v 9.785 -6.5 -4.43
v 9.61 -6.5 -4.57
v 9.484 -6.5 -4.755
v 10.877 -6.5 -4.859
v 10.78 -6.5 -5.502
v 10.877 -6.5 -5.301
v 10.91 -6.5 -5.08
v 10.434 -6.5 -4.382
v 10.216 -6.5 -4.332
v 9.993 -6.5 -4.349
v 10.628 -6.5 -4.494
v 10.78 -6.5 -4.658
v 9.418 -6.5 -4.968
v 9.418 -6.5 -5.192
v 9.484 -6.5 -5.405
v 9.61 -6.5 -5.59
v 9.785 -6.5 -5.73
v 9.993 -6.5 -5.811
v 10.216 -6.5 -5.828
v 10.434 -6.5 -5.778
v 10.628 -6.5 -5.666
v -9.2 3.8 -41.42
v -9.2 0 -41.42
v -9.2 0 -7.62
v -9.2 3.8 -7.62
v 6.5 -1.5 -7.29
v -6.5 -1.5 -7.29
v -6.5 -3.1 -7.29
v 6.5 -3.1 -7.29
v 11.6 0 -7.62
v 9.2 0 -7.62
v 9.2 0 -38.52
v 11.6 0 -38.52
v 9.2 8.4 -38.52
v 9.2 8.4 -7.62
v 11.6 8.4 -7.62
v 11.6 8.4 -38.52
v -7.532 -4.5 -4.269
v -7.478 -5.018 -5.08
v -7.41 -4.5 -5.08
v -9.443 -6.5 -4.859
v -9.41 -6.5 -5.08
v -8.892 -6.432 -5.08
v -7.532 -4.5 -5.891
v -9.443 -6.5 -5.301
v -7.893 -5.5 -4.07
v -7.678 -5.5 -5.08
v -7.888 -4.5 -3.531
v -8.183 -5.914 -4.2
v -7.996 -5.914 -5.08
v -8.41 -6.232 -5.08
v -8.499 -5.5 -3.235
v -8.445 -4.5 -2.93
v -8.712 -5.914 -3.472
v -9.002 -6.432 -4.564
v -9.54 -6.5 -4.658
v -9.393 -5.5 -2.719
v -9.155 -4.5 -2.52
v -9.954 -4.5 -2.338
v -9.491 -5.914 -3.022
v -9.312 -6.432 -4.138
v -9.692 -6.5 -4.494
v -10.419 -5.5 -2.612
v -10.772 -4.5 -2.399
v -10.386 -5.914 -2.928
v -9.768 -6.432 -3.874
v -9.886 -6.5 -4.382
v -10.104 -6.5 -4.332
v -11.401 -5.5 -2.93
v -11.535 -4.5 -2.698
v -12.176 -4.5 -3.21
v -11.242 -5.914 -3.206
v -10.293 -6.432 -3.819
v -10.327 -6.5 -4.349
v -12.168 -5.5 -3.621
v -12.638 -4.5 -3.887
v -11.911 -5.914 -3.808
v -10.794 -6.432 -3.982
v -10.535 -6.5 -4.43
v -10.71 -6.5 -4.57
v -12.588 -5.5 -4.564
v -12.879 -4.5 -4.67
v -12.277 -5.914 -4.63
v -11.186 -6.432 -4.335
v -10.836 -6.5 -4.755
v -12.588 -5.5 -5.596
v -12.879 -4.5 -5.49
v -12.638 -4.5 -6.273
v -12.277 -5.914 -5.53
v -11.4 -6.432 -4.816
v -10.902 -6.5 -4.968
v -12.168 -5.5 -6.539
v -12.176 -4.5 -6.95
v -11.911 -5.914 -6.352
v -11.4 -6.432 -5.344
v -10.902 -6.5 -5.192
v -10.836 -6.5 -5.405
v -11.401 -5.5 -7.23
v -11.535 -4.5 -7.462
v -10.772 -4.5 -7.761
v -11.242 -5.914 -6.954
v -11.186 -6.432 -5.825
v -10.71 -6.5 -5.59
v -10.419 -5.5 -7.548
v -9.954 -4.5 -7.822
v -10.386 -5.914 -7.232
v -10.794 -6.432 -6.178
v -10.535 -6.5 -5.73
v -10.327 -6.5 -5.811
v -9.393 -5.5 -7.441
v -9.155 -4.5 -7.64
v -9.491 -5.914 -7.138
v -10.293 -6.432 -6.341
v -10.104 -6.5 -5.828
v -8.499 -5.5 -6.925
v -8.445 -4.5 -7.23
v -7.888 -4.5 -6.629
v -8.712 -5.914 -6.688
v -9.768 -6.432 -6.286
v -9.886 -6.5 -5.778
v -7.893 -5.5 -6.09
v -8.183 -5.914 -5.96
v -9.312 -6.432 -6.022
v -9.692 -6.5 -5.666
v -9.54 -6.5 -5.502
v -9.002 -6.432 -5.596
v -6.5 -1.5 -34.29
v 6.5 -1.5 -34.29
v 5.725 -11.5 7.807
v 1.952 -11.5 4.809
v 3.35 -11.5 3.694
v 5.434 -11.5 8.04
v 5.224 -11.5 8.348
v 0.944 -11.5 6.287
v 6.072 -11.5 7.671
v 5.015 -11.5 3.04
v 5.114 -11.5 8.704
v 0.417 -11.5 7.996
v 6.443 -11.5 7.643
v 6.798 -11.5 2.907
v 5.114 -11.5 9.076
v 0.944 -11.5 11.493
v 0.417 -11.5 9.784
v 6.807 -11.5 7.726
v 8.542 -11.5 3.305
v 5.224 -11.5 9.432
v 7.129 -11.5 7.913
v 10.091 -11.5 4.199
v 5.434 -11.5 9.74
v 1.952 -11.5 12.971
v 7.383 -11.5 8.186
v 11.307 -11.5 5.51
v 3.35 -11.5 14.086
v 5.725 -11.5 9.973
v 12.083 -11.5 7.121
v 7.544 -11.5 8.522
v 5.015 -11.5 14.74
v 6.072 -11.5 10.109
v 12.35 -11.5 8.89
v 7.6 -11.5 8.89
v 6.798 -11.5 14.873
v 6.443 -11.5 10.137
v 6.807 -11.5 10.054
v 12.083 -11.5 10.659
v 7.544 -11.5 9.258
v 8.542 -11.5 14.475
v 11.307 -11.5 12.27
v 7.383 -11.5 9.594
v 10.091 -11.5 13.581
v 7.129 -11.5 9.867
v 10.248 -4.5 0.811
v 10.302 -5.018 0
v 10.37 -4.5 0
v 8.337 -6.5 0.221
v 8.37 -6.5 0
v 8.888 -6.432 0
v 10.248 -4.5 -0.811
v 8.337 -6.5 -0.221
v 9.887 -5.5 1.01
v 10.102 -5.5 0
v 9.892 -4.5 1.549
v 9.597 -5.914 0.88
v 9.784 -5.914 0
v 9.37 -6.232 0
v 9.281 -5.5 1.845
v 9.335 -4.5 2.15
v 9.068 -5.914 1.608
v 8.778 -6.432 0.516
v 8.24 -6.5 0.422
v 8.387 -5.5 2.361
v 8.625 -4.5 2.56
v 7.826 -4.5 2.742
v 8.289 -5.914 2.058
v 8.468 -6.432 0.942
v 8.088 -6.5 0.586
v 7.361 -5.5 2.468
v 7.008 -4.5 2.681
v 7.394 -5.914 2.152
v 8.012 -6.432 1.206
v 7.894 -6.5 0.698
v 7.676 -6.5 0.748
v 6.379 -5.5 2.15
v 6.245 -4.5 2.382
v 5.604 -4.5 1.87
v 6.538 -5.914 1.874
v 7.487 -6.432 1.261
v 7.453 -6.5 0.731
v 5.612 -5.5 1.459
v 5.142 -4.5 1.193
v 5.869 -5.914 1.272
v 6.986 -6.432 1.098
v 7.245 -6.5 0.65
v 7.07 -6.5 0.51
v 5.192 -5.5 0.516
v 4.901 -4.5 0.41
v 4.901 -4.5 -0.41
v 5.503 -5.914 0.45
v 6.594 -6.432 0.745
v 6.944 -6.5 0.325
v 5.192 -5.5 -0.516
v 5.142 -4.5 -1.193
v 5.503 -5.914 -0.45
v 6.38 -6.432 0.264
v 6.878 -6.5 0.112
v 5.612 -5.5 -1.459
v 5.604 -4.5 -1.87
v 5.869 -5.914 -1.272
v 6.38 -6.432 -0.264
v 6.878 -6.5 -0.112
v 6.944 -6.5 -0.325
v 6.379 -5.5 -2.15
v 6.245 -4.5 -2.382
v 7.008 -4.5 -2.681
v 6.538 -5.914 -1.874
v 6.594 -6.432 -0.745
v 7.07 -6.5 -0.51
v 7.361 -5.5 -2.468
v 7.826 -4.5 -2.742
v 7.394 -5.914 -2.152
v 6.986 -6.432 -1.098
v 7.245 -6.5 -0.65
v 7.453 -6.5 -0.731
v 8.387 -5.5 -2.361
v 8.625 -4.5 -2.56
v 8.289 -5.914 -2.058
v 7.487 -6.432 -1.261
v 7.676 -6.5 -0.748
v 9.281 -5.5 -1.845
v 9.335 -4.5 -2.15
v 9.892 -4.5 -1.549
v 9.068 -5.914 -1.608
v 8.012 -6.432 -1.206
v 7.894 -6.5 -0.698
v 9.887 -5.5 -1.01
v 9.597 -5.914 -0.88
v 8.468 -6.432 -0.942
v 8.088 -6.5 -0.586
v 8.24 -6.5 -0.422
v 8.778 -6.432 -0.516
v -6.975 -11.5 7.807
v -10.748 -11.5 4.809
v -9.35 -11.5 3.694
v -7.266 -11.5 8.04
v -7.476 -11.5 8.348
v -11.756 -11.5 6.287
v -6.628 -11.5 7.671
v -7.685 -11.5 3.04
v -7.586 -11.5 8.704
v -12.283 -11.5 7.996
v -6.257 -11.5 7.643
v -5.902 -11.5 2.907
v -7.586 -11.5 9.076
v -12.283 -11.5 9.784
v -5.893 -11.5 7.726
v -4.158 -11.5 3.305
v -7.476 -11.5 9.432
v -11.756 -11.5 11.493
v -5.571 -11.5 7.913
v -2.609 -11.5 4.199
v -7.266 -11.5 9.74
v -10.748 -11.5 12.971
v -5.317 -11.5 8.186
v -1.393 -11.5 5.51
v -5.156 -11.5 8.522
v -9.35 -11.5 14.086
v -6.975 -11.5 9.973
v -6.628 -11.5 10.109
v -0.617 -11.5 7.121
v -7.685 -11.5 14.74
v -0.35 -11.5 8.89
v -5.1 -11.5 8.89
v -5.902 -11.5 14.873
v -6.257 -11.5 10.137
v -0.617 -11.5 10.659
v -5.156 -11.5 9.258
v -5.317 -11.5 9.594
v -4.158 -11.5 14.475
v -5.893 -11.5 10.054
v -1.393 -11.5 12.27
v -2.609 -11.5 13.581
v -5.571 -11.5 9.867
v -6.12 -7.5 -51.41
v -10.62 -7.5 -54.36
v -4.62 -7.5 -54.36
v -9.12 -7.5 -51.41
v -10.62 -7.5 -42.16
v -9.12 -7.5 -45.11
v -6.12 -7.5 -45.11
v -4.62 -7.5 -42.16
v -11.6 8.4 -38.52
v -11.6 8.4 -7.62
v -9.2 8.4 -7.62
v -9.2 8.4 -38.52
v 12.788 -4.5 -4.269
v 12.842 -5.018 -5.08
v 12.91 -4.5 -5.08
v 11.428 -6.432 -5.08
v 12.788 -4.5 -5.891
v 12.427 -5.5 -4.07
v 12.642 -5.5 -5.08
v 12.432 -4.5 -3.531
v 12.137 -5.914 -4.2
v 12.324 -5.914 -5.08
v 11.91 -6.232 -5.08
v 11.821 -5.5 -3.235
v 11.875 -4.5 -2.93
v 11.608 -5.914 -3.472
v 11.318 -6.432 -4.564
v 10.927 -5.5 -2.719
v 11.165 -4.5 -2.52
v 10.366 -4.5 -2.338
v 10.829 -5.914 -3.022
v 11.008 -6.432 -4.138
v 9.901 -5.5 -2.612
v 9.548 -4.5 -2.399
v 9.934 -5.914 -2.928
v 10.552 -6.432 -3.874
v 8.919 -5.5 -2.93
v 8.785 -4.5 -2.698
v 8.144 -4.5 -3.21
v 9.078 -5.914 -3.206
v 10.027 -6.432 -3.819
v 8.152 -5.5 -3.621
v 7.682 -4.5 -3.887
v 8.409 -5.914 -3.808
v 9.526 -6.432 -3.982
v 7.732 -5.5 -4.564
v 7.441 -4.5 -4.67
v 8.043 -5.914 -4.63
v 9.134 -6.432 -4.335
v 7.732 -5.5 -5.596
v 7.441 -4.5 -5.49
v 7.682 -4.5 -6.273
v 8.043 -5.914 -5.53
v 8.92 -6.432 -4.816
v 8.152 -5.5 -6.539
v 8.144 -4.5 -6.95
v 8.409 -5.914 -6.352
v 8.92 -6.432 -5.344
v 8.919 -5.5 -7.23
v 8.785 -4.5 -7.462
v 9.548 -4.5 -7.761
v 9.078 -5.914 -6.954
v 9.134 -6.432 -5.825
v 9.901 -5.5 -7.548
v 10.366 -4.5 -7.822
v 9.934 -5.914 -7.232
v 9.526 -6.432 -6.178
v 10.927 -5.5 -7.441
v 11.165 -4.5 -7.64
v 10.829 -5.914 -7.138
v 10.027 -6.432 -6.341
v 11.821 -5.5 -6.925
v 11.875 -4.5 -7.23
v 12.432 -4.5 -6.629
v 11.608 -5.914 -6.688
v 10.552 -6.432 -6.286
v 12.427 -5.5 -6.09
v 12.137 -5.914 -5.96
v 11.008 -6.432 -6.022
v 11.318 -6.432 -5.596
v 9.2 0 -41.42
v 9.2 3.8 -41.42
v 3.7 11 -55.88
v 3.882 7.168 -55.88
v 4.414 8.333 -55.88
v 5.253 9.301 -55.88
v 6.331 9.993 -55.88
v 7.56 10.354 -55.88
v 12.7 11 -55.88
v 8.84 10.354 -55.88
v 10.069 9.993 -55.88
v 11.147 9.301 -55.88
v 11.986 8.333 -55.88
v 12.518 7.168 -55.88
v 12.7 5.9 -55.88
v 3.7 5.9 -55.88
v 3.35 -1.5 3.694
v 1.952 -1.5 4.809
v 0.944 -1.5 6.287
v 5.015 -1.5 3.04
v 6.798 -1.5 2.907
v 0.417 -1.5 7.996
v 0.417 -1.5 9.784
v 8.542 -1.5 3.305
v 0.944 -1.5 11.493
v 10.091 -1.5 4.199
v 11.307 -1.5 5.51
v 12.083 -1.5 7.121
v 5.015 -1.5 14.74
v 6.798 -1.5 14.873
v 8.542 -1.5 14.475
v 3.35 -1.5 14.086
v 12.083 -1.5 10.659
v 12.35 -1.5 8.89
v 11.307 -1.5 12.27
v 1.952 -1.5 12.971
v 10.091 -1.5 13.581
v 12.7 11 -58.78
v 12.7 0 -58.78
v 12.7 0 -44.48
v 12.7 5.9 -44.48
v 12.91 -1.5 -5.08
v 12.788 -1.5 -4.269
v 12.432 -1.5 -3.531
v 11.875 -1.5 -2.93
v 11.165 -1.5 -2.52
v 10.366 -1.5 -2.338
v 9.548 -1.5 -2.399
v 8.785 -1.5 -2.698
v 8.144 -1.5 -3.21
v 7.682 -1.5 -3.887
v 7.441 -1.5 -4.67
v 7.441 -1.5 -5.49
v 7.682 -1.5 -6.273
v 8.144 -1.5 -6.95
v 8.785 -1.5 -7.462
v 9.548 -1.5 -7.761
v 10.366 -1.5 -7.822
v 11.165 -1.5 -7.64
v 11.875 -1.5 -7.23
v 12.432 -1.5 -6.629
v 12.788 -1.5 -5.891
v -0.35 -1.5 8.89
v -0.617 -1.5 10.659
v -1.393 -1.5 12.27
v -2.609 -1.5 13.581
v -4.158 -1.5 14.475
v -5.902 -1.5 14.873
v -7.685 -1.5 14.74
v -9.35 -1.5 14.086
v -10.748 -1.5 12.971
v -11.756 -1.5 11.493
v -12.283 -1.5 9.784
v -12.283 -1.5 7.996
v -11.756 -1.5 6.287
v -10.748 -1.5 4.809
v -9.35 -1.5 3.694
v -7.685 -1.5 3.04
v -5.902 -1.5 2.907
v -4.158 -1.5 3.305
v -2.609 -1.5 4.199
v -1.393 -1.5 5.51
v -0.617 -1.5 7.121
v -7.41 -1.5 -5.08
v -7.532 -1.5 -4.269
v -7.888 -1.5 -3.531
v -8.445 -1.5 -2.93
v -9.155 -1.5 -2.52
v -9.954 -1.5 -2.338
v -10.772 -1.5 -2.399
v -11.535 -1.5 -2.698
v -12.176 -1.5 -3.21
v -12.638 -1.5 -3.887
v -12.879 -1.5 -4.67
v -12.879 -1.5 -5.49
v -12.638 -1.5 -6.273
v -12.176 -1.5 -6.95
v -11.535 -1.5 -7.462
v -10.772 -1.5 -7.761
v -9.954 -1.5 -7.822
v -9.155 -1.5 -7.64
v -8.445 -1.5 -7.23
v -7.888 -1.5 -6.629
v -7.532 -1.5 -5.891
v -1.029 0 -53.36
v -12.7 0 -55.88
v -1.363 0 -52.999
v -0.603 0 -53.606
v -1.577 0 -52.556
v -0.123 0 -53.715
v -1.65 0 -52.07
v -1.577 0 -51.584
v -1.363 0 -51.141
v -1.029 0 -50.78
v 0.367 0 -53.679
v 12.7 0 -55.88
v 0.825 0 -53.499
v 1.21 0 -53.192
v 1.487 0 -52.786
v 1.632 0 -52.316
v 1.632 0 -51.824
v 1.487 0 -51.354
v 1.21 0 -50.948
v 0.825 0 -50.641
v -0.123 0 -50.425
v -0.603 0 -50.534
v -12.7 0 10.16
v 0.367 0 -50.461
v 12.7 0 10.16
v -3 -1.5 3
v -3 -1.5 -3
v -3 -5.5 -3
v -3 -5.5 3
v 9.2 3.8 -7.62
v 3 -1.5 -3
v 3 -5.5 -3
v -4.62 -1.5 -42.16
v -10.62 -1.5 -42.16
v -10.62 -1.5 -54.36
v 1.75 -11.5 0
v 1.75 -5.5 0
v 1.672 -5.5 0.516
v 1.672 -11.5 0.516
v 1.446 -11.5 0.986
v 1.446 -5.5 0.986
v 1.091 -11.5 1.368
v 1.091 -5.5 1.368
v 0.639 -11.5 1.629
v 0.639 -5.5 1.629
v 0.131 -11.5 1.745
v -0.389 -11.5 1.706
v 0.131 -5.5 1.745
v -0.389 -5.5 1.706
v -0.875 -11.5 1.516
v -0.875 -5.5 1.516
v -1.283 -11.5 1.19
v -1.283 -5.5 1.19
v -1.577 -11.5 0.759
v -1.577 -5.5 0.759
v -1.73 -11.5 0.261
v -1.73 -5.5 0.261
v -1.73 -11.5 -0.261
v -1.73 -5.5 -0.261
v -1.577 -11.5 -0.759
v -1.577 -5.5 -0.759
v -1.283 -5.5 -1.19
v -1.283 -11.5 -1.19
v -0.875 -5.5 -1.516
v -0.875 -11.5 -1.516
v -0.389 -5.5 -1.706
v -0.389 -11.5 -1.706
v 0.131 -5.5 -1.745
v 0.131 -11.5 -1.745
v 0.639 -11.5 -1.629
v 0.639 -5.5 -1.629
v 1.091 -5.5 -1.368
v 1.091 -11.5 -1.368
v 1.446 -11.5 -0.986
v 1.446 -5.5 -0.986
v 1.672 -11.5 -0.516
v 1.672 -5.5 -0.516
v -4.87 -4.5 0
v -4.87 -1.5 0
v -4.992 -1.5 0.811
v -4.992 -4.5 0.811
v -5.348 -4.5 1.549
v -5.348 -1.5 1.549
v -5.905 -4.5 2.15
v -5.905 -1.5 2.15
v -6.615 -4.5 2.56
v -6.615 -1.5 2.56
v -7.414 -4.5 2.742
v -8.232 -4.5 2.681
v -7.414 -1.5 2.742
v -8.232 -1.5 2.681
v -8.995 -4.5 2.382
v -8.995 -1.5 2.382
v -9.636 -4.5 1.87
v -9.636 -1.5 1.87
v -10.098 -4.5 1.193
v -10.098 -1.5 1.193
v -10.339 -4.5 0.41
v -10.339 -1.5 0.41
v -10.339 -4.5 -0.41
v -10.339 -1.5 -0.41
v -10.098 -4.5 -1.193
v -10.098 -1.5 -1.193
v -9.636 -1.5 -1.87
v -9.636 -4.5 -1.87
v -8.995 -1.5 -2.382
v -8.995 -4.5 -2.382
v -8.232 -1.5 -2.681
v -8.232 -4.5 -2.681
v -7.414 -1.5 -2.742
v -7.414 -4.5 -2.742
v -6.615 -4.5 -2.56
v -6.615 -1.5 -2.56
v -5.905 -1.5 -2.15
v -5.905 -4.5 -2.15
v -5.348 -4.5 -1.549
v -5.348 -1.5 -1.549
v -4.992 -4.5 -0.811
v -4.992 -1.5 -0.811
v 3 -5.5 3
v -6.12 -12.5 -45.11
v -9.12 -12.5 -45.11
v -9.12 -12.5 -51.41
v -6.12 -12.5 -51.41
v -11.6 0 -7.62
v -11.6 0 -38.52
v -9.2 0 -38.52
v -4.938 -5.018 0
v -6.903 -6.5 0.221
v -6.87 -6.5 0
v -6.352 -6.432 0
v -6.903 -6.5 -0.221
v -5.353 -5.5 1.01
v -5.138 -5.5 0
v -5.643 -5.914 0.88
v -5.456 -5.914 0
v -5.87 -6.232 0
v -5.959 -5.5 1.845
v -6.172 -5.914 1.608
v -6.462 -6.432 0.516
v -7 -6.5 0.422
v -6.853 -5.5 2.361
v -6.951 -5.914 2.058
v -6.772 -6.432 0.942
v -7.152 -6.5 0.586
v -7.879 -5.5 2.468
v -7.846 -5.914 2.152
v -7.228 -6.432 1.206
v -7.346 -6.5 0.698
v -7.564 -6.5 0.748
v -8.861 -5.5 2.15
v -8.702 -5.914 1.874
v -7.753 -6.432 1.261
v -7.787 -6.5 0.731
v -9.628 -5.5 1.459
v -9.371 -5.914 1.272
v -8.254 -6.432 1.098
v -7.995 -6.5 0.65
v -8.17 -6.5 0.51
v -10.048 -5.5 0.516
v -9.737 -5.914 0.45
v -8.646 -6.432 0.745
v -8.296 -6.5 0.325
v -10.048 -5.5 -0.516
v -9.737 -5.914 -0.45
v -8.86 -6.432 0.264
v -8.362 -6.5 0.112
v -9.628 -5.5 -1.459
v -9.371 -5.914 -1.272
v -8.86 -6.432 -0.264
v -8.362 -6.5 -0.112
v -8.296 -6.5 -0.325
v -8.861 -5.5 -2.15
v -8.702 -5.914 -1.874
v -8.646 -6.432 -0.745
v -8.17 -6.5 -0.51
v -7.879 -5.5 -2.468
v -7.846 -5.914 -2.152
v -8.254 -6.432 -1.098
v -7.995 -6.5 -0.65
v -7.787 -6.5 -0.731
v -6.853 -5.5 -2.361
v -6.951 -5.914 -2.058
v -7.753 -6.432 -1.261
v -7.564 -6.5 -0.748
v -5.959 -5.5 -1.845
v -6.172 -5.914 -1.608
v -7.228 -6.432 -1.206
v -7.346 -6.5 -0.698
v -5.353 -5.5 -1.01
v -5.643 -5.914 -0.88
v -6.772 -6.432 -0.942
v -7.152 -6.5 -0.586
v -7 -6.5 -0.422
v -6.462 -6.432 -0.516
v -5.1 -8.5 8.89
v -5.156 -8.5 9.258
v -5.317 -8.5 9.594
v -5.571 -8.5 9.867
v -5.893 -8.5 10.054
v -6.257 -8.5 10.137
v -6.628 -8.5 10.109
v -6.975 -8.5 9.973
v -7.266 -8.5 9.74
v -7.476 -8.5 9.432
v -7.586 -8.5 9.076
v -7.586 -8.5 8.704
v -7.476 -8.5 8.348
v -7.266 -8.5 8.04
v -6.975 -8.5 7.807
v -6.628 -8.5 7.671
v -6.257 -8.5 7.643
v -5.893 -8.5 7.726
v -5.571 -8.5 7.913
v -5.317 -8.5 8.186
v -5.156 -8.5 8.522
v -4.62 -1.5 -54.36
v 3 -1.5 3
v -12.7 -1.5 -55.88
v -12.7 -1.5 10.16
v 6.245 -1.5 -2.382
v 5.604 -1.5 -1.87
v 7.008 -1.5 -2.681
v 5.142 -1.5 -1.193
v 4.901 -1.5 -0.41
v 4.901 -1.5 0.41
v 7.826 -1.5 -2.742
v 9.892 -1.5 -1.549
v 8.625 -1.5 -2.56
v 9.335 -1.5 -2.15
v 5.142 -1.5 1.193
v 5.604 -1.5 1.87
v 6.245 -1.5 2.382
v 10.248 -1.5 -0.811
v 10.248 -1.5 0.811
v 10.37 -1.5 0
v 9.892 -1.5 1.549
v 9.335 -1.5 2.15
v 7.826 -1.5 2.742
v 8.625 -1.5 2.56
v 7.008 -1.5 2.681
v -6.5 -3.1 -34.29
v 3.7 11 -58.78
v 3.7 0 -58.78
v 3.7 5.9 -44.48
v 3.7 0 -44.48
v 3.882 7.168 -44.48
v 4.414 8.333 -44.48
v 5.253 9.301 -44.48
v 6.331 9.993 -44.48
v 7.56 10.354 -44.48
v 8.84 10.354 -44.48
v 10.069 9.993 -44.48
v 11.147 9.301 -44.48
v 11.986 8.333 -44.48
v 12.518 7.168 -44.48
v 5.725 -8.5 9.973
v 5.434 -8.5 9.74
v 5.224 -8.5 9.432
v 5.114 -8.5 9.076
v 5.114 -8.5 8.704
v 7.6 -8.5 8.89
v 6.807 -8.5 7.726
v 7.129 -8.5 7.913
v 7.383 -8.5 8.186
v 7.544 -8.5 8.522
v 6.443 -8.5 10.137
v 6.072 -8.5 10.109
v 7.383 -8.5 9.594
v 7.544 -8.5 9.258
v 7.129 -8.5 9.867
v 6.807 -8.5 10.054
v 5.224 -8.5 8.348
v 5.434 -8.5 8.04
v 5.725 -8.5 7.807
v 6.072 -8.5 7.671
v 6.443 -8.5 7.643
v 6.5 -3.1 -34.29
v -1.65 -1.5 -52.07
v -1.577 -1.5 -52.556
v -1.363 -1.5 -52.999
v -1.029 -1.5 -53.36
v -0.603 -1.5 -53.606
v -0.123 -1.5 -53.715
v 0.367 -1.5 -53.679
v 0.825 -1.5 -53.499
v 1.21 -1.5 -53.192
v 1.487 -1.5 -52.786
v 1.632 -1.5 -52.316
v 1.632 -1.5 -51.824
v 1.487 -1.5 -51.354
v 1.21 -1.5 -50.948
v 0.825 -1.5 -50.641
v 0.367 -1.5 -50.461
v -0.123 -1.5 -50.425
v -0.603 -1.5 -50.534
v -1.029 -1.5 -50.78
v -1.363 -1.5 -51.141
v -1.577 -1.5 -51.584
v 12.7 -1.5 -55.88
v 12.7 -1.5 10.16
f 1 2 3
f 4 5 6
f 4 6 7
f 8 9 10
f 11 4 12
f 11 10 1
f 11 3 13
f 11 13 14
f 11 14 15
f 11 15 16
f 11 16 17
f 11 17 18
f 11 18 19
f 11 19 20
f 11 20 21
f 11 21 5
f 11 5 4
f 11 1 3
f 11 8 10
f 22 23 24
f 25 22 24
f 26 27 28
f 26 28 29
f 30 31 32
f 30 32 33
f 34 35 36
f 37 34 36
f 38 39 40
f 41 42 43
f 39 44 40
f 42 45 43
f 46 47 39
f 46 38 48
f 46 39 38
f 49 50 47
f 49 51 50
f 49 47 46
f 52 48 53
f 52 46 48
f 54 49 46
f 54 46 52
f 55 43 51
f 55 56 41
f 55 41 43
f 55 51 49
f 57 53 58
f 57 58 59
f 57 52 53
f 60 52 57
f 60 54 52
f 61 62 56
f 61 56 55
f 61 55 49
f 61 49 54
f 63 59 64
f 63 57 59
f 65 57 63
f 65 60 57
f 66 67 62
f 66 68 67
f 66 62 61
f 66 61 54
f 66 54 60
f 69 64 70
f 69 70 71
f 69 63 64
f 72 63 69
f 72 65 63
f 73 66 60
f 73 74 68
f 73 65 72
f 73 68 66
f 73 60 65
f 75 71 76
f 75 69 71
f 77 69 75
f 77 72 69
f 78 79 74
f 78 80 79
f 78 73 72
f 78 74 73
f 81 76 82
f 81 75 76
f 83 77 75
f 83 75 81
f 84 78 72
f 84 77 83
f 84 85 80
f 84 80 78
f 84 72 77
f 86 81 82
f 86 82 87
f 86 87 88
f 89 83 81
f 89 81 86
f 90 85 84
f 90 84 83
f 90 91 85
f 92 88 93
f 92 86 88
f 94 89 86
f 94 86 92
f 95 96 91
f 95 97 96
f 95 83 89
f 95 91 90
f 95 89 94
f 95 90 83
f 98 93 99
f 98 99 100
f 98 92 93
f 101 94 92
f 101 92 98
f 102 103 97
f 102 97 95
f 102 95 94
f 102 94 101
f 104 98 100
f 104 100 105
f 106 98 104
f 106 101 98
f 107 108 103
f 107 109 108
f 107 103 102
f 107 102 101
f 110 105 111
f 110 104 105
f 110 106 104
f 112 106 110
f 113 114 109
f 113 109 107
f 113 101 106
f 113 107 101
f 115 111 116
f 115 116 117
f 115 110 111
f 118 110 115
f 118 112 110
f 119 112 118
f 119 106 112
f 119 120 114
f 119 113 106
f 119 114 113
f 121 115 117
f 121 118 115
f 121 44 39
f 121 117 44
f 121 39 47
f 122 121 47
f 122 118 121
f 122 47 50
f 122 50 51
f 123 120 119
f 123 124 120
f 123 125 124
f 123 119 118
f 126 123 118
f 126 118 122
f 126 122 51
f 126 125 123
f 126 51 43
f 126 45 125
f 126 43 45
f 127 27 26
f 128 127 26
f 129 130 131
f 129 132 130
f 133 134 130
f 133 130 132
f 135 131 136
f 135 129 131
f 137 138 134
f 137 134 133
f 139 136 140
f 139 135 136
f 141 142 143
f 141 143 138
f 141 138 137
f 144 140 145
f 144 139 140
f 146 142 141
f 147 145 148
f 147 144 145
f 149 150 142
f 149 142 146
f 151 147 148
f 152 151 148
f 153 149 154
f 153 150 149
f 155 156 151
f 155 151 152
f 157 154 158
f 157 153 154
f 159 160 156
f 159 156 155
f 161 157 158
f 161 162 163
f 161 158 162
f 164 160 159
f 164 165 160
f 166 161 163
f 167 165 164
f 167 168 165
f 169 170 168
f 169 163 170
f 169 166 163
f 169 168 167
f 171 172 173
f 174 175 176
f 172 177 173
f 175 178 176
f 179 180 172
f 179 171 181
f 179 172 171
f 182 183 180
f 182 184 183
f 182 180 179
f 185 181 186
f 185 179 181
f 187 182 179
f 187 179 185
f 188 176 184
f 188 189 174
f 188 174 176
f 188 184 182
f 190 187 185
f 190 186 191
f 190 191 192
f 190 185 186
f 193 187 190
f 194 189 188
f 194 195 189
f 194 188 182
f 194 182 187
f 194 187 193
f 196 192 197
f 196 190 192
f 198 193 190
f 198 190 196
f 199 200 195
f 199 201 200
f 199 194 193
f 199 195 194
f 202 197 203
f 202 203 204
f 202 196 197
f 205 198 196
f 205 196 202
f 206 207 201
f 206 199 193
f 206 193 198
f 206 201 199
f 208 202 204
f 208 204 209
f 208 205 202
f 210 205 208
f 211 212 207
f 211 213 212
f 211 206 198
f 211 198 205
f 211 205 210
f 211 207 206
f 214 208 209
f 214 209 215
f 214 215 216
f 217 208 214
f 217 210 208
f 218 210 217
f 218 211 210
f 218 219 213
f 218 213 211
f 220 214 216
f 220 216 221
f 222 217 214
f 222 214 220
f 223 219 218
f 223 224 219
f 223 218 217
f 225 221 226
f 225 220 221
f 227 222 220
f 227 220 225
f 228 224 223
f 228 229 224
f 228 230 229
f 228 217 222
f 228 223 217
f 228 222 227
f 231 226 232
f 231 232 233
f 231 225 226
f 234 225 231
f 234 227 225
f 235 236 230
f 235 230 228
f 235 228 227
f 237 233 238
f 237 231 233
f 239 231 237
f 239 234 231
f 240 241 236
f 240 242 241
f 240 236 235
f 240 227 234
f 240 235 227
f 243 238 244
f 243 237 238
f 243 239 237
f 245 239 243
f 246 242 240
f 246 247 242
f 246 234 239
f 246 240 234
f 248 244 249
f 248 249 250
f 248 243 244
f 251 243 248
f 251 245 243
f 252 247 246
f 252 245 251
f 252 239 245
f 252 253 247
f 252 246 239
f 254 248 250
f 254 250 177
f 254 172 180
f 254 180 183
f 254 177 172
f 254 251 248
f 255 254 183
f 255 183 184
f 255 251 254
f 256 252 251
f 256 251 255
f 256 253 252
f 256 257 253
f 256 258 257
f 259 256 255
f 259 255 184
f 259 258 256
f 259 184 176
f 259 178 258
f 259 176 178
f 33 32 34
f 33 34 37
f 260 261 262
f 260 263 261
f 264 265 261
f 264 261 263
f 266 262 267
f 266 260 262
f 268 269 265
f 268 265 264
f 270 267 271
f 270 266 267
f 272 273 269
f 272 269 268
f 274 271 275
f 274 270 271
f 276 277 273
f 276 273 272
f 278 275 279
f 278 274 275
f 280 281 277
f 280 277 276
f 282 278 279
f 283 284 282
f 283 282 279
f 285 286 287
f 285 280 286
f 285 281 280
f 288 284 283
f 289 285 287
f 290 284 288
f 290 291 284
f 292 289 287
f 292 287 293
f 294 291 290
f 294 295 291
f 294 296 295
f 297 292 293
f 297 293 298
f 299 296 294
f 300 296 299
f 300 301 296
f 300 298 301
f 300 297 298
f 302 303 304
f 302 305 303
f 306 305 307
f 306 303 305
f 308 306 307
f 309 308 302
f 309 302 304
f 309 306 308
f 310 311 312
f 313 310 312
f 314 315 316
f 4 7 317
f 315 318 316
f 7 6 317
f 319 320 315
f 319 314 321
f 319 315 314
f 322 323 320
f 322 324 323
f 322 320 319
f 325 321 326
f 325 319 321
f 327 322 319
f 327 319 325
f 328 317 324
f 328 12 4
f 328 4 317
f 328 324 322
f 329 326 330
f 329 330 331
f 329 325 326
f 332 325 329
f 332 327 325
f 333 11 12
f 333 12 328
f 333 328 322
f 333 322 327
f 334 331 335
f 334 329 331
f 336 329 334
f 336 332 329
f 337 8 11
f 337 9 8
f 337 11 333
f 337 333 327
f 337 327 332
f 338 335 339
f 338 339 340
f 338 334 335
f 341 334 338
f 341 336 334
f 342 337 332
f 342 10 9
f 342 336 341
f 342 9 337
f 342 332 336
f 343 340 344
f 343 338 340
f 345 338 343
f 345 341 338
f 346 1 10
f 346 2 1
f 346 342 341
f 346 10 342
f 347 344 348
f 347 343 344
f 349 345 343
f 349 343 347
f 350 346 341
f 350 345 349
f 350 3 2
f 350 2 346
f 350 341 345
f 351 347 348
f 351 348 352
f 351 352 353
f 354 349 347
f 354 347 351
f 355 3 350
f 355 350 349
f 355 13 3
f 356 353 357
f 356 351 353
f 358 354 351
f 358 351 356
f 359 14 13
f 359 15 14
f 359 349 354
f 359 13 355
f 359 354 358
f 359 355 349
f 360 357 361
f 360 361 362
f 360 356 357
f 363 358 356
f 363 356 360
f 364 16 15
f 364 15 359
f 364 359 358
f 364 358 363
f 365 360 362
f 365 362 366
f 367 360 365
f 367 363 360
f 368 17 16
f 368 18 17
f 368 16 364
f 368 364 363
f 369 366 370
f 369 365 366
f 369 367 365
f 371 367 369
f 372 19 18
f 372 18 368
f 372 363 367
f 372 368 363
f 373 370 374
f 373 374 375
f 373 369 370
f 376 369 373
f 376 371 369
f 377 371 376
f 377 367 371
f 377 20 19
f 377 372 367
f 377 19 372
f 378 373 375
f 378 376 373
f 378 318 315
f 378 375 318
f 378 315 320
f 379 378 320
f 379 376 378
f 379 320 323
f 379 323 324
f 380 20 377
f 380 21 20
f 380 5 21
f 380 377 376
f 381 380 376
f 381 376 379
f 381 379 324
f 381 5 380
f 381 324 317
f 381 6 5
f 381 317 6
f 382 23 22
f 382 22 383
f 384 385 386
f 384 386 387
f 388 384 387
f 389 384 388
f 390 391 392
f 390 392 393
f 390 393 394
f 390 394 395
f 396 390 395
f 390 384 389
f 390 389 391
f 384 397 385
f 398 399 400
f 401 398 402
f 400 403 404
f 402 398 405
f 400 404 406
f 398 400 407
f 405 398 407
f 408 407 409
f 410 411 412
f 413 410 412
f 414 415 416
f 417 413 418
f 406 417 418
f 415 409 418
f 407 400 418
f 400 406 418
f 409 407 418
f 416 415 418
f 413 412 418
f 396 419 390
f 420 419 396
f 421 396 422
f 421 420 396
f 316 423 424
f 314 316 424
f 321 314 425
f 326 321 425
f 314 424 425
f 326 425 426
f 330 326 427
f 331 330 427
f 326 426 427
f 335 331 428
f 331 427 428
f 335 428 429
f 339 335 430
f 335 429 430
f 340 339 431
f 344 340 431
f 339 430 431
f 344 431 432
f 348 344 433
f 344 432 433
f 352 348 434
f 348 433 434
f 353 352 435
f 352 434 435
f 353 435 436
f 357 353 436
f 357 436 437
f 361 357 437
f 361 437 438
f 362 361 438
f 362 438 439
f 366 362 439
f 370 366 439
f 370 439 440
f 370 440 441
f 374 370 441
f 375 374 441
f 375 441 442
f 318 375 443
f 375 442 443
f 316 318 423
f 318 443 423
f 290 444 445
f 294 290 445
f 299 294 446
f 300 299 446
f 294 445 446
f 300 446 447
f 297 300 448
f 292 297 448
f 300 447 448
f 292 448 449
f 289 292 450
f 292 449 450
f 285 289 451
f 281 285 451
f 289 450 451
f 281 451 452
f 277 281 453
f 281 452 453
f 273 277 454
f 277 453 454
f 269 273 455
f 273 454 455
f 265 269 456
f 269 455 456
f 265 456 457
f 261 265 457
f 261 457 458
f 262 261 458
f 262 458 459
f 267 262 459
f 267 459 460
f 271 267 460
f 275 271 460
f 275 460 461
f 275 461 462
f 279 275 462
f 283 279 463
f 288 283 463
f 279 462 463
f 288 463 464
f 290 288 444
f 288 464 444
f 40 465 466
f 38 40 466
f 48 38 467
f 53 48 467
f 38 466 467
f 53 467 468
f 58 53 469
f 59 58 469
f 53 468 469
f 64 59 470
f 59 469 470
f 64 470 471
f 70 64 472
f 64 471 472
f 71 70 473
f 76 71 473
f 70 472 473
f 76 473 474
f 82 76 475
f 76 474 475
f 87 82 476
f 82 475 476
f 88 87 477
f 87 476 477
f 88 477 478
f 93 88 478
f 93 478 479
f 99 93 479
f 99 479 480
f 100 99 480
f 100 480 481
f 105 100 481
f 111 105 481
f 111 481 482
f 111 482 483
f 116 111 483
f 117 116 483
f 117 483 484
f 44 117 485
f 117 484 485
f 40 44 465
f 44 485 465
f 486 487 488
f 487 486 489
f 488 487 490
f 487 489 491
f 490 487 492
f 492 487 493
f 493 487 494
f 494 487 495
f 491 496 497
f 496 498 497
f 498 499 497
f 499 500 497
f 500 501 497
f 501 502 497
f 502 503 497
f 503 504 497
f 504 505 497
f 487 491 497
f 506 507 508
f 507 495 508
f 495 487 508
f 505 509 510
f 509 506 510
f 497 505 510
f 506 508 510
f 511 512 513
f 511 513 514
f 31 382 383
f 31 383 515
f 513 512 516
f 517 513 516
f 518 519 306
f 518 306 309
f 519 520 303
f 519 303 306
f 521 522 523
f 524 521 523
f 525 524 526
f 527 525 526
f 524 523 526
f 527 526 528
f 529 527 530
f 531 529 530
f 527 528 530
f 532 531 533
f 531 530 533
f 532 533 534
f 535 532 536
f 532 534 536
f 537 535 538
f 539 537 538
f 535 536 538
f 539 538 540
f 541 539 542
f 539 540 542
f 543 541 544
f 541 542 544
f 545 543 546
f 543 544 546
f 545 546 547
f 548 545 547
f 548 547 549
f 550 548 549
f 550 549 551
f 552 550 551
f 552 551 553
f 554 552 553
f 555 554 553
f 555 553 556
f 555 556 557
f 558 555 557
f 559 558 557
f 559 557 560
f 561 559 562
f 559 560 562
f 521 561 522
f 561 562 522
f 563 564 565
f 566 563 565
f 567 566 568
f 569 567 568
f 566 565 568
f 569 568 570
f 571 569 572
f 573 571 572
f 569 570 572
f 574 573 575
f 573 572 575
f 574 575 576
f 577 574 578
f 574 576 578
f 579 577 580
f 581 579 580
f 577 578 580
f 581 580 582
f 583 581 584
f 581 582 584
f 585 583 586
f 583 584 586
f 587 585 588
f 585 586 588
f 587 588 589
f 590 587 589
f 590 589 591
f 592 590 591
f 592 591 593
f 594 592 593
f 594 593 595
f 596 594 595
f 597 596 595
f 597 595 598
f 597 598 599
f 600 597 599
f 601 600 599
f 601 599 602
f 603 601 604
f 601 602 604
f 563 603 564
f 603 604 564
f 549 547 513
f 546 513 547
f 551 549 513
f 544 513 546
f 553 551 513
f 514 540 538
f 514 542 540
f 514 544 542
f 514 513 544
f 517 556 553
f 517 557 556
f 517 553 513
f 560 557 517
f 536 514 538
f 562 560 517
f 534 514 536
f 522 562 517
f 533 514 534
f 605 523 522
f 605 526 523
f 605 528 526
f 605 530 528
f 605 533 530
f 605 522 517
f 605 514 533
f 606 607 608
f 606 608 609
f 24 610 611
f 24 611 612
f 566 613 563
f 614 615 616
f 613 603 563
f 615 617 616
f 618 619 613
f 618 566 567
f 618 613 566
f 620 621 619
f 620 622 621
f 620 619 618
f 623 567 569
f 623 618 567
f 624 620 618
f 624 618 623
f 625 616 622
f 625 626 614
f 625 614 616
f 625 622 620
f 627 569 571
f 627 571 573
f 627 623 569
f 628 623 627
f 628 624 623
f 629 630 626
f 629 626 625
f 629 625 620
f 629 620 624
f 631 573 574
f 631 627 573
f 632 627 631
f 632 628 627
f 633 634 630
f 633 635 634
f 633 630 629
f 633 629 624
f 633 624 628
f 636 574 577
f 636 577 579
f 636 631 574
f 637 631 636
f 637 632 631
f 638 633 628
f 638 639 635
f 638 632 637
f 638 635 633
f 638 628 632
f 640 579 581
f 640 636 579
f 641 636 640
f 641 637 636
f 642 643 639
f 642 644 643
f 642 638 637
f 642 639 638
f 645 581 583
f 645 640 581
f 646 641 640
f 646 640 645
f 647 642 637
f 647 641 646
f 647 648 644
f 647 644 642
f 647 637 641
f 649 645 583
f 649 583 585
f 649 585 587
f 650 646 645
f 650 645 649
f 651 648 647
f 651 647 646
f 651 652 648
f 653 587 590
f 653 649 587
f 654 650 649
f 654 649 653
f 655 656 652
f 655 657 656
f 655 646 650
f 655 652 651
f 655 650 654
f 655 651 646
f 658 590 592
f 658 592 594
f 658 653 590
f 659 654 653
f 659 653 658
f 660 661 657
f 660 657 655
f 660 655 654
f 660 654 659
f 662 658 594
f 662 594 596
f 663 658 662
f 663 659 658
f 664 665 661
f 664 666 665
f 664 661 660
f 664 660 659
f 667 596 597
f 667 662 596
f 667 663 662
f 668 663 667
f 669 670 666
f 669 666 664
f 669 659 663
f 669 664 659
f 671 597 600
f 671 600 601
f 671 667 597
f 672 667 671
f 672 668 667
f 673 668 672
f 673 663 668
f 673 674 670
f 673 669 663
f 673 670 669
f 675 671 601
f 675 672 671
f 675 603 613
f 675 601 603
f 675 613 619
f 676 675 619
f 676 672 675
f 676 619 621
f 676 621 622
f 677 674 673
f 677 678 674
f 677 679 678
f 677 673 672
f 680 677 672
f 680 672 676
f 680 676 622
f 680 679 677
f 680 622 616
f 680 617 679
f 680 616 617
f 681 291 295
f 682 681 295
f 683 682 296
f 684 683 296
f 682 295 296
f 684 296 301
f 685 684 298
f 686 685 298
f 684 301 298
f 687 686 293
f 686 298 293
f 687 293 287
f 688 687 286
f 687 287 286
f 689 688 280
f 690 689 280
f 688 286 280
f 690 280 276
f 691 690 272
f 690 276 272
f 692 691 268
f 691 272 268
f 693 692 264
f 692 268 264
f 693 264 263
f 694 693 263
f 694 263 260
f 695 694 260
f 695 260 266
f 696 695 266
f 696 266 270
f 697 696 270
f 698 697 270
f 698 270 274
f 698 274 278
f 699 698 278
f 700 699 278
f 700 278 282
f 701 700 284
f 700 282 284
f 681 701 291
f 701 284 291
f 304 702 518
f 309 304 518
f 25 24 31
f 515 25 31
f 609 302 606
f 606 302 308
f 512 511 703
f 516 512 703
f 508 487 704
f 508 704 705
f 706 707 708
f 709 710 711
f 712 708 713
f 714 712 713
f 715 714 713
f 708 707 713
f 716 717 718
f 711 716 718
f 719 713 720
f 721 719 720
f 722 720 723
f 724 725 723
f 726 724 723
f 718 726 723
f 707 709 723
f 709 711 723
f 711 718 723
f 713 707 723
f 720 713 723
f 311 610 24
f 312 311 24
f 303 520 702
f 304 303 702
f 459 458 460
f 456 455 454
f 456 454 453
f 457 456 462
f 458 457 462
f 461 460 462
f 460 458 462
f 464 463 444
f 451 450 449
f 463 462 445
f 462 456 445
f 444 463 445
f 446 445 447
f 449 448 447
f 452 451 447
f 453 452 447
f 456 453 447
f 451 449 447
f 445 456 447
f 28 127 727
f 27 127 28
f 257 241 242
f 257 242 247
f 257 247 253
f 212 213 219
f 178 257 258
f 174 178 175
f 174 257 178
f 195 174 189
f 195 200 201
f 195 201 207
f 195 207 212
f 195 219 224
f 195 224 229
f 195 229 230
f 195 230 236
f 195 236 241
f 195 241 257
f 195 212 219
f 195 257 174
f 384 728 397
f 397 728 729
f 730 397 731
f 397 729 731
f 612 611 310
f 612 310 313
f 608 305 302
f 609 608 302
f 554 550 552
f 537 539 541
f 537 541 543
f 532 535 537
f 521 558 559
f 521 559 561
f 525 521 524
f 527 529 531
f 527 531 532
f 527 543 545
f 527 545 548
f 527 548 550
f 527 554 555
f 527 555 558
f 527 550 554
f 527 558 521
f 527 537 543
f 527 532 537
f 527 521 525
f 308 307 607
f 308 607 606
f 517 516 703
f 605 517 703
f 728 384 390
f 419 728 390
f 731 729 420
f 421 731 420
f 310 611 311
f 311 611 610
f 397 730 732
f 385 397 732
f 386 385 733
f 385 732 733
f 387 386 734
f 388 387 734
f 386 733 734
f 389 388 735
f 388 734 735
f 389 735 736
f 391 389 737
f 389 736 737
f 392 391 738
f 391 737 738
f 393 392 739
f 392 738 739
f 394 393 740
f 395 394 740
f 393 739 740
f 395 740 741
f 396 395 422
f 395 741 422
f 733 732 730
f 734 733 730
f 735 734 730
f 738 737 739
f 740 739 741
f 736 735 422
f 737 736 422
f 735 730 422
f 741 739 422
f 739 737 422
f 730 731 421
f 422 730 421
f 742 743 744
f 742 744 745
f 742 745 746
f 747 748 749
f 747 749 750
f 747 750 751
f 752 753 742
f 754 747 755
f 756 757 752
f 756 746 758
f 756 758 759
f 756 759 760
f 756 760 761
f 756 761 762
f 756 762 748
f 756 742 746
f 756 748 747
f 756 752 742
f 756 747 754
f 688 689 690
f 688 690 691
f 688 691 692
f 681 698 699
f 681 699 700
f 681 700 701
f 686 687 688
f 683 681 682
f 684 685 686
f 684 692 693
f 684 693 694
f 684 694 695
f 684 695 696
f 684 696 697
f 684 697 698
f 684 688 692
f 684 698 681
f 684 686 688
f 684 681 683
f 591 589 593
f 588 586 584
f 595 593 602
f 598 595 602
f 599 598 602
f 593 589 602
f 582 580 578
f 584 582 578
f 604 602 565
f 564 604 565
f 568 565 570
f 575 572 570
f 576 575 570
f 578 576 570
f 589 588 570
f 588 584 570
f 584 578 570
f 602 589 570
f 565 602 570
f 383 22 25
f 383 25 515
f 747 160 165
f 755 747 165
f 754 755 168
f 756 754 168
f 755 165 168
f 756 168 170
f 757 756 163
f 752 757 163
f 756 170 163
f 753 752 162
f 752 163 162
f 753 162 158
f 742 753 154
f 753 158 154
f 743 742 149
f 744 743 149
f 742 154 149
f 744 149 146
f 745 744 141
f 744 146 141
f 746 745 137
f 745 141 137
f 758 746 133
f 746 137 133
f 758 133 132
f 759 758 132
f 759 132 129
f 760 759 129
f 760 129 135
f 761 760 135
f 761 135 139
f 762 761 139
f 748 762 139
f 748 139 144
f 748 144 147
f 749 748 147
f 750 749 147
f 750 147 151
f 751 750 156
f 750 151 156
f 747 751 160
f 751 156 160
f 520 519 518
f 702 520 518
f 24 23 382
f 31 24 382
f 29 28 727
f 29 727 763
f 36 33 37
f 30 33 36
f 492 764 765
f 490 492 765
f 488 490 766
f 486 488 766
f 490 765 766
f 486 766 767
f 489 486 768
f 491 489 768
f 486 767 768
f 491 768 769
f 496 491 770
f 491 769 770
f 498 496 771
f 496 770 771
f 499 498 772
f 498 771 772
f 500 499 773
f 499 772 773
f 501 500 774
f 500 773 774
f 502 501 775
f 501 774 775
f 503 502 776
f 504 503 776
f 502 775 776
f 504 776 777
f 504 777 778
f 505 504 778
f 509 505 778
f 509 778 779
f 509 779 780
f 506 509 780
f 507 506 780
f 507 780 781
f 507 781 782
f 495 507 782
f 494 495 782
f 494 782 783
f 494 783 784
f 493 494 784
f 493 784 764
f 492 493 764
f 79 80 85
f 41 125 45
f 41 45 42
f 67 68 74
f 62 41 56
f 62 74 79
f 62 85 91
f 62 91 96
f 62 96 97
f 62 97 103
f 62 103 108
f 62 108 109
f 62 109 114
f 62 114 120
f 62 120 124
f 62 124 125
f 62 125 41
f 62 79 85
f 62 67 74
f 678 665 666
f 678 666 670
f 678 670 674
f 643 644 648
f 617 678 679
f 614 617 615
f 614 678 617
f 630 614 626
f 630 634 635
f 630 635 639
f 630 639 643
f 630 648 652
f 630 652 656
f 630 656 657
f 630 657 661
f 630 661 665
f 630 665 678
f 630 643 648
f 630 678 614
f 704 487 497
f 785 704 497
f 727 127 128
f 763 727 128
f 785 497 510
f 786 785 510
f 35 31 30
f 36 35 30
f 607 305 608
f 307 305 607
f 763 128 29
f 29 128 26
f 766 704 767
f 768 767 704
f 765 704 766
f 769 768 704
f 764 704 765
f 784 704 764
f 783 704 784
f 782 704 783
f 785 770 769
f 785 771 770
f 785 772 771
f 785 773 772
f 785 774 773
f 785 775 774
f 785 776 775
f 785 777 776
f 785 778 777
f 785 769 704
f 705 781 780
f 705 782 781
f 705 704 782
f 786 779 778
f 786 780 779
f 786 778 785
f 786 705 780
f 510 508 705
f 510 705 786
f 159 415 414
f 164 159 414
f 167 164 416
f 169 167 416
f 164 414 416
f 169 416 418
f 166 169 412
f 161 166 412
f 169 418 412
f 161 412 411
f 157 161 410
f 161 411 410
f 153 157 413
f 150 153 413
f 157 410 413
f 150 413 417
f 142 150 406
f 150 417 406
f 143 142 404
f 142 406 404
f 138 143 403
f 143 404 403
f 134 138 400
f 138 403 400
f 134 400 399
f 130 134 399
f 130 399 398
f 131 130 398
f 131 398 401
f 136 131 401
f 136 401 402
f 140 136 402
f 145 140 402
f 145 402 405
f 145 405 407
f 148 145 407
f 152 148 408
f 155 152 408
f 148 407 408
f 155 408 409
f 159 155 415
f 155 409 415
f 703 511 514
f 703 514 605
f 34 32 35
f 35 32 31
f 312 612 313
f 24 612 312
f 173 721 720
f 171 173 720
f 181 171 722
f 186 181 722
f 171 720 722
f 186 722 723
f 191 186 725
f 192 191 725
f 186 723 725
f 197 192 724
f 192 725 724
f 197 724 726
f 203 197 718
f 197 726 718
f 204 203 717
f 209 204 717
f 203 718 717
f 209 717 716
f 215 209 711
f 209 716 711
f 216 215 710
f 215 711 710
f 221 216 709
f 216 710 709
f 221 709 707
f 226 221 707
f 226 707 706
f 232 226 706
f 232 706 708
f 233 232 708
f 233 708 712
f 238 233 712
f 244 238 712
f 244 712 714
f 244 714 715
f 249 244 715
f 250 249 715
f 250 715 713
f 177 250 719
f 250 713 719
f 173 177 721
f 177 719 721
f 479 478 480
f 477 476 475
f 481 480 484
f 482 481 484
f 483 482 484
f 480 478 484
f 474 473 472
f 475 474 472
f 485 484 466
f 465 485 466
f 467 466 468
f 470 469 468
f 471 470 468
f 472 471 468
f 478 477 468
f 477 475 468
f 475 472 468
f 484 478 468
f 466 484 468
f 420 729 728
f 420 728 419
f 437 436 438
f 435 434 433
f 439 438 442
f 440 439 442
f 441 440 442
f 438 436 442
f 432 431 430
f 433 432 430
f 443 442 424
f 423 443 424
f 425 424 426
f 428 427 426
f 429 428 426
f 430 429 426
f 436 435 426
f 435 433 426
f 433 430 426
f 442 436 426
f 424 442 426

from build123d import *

# Parameters (mm, degrees)
F0_W      = 25.4
F0_H      = 66.04
F1_DEPTH  = 1.5
F2_D      = 3.3
F3_R      = 6
F4_DEPTH  = 10
F5_W      = 6
F5_H      = 6
F6_DEPTH  = 4
F7_R      = 1.75
F8_DEPTH  = 6
F9_R      = 2.75
F10_DEPTH = 5
F11_R     = 2
F11_2_R   = 2
F11_3_R   = 2
F11_4_R   = 2
F12_W     = 13
F12_H     = 27
F13_DEPTH = 1.6
F14_W     = 6
F14_H     = 12.2
F15_DEPTH = 6
F16_W     = 3
F16_H     = 6.3
F17_DEPTH = 5
F18_W     = 18.4
F18_H     = 33.8
F19_DEPTH = 3.8
F20_W     = 2.4
F20_H     = 30.9
F21_DEPTH = 8.4
F22_W     = 9
F22_H     = 14.3
F23_DEPTH = 11
F25_DEPTH = 11.4
F26_R     = 1.25
F27_DEPTH = 3


with BuildPart() as f1:
    # F0 (on Front) → F1 (new body)
    with BuildSketch(Plane.XZ):
        with Locations((0, -22.86)):
            Rectangle(F0_W, F0_H)
    extrude(amount=F1_DEPTH)

    # F2 (through all)
    with Locations(Plane(origin=(0, 0, 0), x_dir=(1, 0, 0), z_dir=(0, 1, 0))):
        with Locations((0, 52.07)):
            Hole(F2_D / 2)


with BuildPart() as f4:
    # F3 (on face) → F4 (new body)
    with BuildSketch(Plane.XZ.offset(1.5)):
        with Locations((-6.35, 8.89)):
            Circle(F3_R)
    extrude(amount=F4_DEPTH)


with BuildPart() as f4b:
    # F3 (on face) → F4, piece 2 (new body)
    with BuildSketch(Plane.XZ.offset(1.5)):
        with Locations((6.35, 8.89)):
            Circle(F3_R)
    extrude(amount=F4_DEPTH)


with BuildPart() as f6:
    # F5 (on face) → F6 (new body)
    with BuildSketch(Plane.XZ.offset(1.5)):
        Rectangle(F5_W, F5_H)
    extrude(amount=F6_DEPTH)

    # F7 (on face) → F8 (join, through all)
    with BuildSketch(Plane.XZ.offset(5.5)):
        Circle(F7_R)
    extrude(amount=F8_DEPTH)


with BuildPart() as f10:
    # F9 (on face) → F10 (new body)
    with BuildSketch(Plane.XZ.offset(1.5)):
        with Locations((-7.62, 0)):
            Circle(F9_R)
    extrude(amount=F10_DEPTH)

    # F11#2
    f11_2_edges = [f10.edges().sort_by_distance(p)[0] for p in [
        (-10.37, -6.5, 0),
    ]]
    fillet(f11_2_edges, radius=F11_2_R)


with BuildPart() as f10b:
    # F9 (on face) → F10, piece 2 (new body)
    with BuildSketch(Plane.XZ.offset(1.5)):
        with Locations((-10.16, -5.08)):
            Circle(F9_R)
    extrude(amount=F10_DEPTH)

    # F11
    f11_edges = [f10b.edges().sort_by_distance(p)[0] for p in [
        (-12.91, -6.5, -5.08),
    ]]
    fillet(f11_edges, radius=F11_R)


with BuildPart() as f10c:
    # F9 (on face) → F10, piece 3 (new body)
    with BuildSketch(Plane.XZ.offset(1.5)):
        with Locations((7.62, 0)):
            Circle(F9_R)
    extrude(amount=F10_DEPTH)

    # F11#3
    f11_3_edges = [f10c.edges().sort_by_distance(p)[0] for p in [
        (4.87, -6.5, 0),
    ]]
    fillet(f11_3_edges, radius=F11_3_R)


with BuildPart() as f10d:
    # F9 (on face) → F10, piece 4 (new body)
    with BuildSketch(Plane.XZ.offset(1.5)):
        with Locations((10.16, -5.08)):
            Circle(F9_R)
    extrude(amount=F10_DEPTH)

    # F11#4
    f11_4_edges = [f10d.edges().sort_by_distance(p)[0] for p in [
        (7.41, -6.5, -5.08),
    ]]
    fillet(f11_4_edges, radius=F11_4_R)


with BuildPart() as f13:
    # F12 (on face) → F13 (new body)
    with BuildSketch(Plane.XZ.offset(1.5)):
        with Locations((0, -20.79)):
            Rectangle(F12_W, F12_H)
    extrude(amount=F13_DEPTH)


with BuildPart() as f15:
    # F14 (on face) → F15 (new body)
    with BuildSketch(Plane.XZ.offset(1.5)):
        with Locations((-7.62, -48.26)):
            Rectangle(F14_W, F14_H)
    extrude(amount=F15_DEPTH)

    # F16 (on face) → F17 (join)
    with BuildSketch(Plane.XZ.offset(7.5)):
        with Locations((-7.62, -48.26)):
            Rectangle(F16_W, F16_H)
    extrude(amount=F17_DEPTH)


with BuildPart() as f19:
    # F18 (on Front) → F19 (new body)
    with BuildSketch(Plane.XZ):
        with Locations((0, -24.52)):
            Rectangle(F18_W, F18_H)
    extrude(amount=-F19_DEPTH)


with BuildPart() as f21:
    # F20 (on Front) → F21 (new body)
    with BuildSketch(Plane.XZ):
        with Locations((10.4, -23.07)):
            Rectangle(F20_W, F20_H)
    extrude(amount=-F21_DEPTH)


with BuildPart() as f21b:
    # F20 (on Front) → F21, piece 2 (new body)
    with BuildSketch(Plane.XZ):
        with Locations((-10.4, -23.07)):
            Rectangle(F20_W, F20_H)
    extrude(amount=-F21_DEPTH)


with BuildPart() as f23:
    # F22 (on Front) → F23 (new body)
    with BuildSketch(Plane.XZ):
        with Locations((8.2, -51.63)):
            Rectangle(F22_W, F22_H)
    extrude(amount=-F23_DEPTH)

    # F24 (on face) → F25 (cut, through all)
    with BuildSketch(Plane.XY.offset(-44.48)):
        with BuildLine():
            ThreePointArc((3.7, 5.9), (8.2, 10.4), (12.7, 5.9))
            Line((12.7, 5.9), (12.7, 11))
            Line((12.7, 11), (3.7, 11))
            Line((3.7, 11), (3.7, 5.9))
        make_face()
    extrude(amount=-F25_DEPTH, mode=Mode.SUBTRACT)


with BuildPart() as f27_tool:
    # F26 (on face) → F27 (new body)
    with BuildSketch(Plane.XZ.offset(11.5)):
        with Locations((-6.35, 8.89)):
            Circle(F26_R)
        with Locations((6.35, 8.89)):
            Circle(F26_R)
    extrude(amount=-F27_DEPTH)


with BuildPart() as f4_1:
    add(f4.part)

    # F27: cut by f27_tool
    add(f27_tool.part, mode=Mode.SUBTRACT)


with BuildPart() as f4b_1:
    add(f4b.part)

    # F27: cut by f27_tool
    add(f27_tool.part, mode=Mode.SUBTRACT)


solid = Compound([f1.part, f6.part, f10.part, f10b.part, f10c.part, f10d.part, f13.part, f15.part, f19.part, f21.part, f21b.part, f23.part, f4_1.part, f4b_1.part])
